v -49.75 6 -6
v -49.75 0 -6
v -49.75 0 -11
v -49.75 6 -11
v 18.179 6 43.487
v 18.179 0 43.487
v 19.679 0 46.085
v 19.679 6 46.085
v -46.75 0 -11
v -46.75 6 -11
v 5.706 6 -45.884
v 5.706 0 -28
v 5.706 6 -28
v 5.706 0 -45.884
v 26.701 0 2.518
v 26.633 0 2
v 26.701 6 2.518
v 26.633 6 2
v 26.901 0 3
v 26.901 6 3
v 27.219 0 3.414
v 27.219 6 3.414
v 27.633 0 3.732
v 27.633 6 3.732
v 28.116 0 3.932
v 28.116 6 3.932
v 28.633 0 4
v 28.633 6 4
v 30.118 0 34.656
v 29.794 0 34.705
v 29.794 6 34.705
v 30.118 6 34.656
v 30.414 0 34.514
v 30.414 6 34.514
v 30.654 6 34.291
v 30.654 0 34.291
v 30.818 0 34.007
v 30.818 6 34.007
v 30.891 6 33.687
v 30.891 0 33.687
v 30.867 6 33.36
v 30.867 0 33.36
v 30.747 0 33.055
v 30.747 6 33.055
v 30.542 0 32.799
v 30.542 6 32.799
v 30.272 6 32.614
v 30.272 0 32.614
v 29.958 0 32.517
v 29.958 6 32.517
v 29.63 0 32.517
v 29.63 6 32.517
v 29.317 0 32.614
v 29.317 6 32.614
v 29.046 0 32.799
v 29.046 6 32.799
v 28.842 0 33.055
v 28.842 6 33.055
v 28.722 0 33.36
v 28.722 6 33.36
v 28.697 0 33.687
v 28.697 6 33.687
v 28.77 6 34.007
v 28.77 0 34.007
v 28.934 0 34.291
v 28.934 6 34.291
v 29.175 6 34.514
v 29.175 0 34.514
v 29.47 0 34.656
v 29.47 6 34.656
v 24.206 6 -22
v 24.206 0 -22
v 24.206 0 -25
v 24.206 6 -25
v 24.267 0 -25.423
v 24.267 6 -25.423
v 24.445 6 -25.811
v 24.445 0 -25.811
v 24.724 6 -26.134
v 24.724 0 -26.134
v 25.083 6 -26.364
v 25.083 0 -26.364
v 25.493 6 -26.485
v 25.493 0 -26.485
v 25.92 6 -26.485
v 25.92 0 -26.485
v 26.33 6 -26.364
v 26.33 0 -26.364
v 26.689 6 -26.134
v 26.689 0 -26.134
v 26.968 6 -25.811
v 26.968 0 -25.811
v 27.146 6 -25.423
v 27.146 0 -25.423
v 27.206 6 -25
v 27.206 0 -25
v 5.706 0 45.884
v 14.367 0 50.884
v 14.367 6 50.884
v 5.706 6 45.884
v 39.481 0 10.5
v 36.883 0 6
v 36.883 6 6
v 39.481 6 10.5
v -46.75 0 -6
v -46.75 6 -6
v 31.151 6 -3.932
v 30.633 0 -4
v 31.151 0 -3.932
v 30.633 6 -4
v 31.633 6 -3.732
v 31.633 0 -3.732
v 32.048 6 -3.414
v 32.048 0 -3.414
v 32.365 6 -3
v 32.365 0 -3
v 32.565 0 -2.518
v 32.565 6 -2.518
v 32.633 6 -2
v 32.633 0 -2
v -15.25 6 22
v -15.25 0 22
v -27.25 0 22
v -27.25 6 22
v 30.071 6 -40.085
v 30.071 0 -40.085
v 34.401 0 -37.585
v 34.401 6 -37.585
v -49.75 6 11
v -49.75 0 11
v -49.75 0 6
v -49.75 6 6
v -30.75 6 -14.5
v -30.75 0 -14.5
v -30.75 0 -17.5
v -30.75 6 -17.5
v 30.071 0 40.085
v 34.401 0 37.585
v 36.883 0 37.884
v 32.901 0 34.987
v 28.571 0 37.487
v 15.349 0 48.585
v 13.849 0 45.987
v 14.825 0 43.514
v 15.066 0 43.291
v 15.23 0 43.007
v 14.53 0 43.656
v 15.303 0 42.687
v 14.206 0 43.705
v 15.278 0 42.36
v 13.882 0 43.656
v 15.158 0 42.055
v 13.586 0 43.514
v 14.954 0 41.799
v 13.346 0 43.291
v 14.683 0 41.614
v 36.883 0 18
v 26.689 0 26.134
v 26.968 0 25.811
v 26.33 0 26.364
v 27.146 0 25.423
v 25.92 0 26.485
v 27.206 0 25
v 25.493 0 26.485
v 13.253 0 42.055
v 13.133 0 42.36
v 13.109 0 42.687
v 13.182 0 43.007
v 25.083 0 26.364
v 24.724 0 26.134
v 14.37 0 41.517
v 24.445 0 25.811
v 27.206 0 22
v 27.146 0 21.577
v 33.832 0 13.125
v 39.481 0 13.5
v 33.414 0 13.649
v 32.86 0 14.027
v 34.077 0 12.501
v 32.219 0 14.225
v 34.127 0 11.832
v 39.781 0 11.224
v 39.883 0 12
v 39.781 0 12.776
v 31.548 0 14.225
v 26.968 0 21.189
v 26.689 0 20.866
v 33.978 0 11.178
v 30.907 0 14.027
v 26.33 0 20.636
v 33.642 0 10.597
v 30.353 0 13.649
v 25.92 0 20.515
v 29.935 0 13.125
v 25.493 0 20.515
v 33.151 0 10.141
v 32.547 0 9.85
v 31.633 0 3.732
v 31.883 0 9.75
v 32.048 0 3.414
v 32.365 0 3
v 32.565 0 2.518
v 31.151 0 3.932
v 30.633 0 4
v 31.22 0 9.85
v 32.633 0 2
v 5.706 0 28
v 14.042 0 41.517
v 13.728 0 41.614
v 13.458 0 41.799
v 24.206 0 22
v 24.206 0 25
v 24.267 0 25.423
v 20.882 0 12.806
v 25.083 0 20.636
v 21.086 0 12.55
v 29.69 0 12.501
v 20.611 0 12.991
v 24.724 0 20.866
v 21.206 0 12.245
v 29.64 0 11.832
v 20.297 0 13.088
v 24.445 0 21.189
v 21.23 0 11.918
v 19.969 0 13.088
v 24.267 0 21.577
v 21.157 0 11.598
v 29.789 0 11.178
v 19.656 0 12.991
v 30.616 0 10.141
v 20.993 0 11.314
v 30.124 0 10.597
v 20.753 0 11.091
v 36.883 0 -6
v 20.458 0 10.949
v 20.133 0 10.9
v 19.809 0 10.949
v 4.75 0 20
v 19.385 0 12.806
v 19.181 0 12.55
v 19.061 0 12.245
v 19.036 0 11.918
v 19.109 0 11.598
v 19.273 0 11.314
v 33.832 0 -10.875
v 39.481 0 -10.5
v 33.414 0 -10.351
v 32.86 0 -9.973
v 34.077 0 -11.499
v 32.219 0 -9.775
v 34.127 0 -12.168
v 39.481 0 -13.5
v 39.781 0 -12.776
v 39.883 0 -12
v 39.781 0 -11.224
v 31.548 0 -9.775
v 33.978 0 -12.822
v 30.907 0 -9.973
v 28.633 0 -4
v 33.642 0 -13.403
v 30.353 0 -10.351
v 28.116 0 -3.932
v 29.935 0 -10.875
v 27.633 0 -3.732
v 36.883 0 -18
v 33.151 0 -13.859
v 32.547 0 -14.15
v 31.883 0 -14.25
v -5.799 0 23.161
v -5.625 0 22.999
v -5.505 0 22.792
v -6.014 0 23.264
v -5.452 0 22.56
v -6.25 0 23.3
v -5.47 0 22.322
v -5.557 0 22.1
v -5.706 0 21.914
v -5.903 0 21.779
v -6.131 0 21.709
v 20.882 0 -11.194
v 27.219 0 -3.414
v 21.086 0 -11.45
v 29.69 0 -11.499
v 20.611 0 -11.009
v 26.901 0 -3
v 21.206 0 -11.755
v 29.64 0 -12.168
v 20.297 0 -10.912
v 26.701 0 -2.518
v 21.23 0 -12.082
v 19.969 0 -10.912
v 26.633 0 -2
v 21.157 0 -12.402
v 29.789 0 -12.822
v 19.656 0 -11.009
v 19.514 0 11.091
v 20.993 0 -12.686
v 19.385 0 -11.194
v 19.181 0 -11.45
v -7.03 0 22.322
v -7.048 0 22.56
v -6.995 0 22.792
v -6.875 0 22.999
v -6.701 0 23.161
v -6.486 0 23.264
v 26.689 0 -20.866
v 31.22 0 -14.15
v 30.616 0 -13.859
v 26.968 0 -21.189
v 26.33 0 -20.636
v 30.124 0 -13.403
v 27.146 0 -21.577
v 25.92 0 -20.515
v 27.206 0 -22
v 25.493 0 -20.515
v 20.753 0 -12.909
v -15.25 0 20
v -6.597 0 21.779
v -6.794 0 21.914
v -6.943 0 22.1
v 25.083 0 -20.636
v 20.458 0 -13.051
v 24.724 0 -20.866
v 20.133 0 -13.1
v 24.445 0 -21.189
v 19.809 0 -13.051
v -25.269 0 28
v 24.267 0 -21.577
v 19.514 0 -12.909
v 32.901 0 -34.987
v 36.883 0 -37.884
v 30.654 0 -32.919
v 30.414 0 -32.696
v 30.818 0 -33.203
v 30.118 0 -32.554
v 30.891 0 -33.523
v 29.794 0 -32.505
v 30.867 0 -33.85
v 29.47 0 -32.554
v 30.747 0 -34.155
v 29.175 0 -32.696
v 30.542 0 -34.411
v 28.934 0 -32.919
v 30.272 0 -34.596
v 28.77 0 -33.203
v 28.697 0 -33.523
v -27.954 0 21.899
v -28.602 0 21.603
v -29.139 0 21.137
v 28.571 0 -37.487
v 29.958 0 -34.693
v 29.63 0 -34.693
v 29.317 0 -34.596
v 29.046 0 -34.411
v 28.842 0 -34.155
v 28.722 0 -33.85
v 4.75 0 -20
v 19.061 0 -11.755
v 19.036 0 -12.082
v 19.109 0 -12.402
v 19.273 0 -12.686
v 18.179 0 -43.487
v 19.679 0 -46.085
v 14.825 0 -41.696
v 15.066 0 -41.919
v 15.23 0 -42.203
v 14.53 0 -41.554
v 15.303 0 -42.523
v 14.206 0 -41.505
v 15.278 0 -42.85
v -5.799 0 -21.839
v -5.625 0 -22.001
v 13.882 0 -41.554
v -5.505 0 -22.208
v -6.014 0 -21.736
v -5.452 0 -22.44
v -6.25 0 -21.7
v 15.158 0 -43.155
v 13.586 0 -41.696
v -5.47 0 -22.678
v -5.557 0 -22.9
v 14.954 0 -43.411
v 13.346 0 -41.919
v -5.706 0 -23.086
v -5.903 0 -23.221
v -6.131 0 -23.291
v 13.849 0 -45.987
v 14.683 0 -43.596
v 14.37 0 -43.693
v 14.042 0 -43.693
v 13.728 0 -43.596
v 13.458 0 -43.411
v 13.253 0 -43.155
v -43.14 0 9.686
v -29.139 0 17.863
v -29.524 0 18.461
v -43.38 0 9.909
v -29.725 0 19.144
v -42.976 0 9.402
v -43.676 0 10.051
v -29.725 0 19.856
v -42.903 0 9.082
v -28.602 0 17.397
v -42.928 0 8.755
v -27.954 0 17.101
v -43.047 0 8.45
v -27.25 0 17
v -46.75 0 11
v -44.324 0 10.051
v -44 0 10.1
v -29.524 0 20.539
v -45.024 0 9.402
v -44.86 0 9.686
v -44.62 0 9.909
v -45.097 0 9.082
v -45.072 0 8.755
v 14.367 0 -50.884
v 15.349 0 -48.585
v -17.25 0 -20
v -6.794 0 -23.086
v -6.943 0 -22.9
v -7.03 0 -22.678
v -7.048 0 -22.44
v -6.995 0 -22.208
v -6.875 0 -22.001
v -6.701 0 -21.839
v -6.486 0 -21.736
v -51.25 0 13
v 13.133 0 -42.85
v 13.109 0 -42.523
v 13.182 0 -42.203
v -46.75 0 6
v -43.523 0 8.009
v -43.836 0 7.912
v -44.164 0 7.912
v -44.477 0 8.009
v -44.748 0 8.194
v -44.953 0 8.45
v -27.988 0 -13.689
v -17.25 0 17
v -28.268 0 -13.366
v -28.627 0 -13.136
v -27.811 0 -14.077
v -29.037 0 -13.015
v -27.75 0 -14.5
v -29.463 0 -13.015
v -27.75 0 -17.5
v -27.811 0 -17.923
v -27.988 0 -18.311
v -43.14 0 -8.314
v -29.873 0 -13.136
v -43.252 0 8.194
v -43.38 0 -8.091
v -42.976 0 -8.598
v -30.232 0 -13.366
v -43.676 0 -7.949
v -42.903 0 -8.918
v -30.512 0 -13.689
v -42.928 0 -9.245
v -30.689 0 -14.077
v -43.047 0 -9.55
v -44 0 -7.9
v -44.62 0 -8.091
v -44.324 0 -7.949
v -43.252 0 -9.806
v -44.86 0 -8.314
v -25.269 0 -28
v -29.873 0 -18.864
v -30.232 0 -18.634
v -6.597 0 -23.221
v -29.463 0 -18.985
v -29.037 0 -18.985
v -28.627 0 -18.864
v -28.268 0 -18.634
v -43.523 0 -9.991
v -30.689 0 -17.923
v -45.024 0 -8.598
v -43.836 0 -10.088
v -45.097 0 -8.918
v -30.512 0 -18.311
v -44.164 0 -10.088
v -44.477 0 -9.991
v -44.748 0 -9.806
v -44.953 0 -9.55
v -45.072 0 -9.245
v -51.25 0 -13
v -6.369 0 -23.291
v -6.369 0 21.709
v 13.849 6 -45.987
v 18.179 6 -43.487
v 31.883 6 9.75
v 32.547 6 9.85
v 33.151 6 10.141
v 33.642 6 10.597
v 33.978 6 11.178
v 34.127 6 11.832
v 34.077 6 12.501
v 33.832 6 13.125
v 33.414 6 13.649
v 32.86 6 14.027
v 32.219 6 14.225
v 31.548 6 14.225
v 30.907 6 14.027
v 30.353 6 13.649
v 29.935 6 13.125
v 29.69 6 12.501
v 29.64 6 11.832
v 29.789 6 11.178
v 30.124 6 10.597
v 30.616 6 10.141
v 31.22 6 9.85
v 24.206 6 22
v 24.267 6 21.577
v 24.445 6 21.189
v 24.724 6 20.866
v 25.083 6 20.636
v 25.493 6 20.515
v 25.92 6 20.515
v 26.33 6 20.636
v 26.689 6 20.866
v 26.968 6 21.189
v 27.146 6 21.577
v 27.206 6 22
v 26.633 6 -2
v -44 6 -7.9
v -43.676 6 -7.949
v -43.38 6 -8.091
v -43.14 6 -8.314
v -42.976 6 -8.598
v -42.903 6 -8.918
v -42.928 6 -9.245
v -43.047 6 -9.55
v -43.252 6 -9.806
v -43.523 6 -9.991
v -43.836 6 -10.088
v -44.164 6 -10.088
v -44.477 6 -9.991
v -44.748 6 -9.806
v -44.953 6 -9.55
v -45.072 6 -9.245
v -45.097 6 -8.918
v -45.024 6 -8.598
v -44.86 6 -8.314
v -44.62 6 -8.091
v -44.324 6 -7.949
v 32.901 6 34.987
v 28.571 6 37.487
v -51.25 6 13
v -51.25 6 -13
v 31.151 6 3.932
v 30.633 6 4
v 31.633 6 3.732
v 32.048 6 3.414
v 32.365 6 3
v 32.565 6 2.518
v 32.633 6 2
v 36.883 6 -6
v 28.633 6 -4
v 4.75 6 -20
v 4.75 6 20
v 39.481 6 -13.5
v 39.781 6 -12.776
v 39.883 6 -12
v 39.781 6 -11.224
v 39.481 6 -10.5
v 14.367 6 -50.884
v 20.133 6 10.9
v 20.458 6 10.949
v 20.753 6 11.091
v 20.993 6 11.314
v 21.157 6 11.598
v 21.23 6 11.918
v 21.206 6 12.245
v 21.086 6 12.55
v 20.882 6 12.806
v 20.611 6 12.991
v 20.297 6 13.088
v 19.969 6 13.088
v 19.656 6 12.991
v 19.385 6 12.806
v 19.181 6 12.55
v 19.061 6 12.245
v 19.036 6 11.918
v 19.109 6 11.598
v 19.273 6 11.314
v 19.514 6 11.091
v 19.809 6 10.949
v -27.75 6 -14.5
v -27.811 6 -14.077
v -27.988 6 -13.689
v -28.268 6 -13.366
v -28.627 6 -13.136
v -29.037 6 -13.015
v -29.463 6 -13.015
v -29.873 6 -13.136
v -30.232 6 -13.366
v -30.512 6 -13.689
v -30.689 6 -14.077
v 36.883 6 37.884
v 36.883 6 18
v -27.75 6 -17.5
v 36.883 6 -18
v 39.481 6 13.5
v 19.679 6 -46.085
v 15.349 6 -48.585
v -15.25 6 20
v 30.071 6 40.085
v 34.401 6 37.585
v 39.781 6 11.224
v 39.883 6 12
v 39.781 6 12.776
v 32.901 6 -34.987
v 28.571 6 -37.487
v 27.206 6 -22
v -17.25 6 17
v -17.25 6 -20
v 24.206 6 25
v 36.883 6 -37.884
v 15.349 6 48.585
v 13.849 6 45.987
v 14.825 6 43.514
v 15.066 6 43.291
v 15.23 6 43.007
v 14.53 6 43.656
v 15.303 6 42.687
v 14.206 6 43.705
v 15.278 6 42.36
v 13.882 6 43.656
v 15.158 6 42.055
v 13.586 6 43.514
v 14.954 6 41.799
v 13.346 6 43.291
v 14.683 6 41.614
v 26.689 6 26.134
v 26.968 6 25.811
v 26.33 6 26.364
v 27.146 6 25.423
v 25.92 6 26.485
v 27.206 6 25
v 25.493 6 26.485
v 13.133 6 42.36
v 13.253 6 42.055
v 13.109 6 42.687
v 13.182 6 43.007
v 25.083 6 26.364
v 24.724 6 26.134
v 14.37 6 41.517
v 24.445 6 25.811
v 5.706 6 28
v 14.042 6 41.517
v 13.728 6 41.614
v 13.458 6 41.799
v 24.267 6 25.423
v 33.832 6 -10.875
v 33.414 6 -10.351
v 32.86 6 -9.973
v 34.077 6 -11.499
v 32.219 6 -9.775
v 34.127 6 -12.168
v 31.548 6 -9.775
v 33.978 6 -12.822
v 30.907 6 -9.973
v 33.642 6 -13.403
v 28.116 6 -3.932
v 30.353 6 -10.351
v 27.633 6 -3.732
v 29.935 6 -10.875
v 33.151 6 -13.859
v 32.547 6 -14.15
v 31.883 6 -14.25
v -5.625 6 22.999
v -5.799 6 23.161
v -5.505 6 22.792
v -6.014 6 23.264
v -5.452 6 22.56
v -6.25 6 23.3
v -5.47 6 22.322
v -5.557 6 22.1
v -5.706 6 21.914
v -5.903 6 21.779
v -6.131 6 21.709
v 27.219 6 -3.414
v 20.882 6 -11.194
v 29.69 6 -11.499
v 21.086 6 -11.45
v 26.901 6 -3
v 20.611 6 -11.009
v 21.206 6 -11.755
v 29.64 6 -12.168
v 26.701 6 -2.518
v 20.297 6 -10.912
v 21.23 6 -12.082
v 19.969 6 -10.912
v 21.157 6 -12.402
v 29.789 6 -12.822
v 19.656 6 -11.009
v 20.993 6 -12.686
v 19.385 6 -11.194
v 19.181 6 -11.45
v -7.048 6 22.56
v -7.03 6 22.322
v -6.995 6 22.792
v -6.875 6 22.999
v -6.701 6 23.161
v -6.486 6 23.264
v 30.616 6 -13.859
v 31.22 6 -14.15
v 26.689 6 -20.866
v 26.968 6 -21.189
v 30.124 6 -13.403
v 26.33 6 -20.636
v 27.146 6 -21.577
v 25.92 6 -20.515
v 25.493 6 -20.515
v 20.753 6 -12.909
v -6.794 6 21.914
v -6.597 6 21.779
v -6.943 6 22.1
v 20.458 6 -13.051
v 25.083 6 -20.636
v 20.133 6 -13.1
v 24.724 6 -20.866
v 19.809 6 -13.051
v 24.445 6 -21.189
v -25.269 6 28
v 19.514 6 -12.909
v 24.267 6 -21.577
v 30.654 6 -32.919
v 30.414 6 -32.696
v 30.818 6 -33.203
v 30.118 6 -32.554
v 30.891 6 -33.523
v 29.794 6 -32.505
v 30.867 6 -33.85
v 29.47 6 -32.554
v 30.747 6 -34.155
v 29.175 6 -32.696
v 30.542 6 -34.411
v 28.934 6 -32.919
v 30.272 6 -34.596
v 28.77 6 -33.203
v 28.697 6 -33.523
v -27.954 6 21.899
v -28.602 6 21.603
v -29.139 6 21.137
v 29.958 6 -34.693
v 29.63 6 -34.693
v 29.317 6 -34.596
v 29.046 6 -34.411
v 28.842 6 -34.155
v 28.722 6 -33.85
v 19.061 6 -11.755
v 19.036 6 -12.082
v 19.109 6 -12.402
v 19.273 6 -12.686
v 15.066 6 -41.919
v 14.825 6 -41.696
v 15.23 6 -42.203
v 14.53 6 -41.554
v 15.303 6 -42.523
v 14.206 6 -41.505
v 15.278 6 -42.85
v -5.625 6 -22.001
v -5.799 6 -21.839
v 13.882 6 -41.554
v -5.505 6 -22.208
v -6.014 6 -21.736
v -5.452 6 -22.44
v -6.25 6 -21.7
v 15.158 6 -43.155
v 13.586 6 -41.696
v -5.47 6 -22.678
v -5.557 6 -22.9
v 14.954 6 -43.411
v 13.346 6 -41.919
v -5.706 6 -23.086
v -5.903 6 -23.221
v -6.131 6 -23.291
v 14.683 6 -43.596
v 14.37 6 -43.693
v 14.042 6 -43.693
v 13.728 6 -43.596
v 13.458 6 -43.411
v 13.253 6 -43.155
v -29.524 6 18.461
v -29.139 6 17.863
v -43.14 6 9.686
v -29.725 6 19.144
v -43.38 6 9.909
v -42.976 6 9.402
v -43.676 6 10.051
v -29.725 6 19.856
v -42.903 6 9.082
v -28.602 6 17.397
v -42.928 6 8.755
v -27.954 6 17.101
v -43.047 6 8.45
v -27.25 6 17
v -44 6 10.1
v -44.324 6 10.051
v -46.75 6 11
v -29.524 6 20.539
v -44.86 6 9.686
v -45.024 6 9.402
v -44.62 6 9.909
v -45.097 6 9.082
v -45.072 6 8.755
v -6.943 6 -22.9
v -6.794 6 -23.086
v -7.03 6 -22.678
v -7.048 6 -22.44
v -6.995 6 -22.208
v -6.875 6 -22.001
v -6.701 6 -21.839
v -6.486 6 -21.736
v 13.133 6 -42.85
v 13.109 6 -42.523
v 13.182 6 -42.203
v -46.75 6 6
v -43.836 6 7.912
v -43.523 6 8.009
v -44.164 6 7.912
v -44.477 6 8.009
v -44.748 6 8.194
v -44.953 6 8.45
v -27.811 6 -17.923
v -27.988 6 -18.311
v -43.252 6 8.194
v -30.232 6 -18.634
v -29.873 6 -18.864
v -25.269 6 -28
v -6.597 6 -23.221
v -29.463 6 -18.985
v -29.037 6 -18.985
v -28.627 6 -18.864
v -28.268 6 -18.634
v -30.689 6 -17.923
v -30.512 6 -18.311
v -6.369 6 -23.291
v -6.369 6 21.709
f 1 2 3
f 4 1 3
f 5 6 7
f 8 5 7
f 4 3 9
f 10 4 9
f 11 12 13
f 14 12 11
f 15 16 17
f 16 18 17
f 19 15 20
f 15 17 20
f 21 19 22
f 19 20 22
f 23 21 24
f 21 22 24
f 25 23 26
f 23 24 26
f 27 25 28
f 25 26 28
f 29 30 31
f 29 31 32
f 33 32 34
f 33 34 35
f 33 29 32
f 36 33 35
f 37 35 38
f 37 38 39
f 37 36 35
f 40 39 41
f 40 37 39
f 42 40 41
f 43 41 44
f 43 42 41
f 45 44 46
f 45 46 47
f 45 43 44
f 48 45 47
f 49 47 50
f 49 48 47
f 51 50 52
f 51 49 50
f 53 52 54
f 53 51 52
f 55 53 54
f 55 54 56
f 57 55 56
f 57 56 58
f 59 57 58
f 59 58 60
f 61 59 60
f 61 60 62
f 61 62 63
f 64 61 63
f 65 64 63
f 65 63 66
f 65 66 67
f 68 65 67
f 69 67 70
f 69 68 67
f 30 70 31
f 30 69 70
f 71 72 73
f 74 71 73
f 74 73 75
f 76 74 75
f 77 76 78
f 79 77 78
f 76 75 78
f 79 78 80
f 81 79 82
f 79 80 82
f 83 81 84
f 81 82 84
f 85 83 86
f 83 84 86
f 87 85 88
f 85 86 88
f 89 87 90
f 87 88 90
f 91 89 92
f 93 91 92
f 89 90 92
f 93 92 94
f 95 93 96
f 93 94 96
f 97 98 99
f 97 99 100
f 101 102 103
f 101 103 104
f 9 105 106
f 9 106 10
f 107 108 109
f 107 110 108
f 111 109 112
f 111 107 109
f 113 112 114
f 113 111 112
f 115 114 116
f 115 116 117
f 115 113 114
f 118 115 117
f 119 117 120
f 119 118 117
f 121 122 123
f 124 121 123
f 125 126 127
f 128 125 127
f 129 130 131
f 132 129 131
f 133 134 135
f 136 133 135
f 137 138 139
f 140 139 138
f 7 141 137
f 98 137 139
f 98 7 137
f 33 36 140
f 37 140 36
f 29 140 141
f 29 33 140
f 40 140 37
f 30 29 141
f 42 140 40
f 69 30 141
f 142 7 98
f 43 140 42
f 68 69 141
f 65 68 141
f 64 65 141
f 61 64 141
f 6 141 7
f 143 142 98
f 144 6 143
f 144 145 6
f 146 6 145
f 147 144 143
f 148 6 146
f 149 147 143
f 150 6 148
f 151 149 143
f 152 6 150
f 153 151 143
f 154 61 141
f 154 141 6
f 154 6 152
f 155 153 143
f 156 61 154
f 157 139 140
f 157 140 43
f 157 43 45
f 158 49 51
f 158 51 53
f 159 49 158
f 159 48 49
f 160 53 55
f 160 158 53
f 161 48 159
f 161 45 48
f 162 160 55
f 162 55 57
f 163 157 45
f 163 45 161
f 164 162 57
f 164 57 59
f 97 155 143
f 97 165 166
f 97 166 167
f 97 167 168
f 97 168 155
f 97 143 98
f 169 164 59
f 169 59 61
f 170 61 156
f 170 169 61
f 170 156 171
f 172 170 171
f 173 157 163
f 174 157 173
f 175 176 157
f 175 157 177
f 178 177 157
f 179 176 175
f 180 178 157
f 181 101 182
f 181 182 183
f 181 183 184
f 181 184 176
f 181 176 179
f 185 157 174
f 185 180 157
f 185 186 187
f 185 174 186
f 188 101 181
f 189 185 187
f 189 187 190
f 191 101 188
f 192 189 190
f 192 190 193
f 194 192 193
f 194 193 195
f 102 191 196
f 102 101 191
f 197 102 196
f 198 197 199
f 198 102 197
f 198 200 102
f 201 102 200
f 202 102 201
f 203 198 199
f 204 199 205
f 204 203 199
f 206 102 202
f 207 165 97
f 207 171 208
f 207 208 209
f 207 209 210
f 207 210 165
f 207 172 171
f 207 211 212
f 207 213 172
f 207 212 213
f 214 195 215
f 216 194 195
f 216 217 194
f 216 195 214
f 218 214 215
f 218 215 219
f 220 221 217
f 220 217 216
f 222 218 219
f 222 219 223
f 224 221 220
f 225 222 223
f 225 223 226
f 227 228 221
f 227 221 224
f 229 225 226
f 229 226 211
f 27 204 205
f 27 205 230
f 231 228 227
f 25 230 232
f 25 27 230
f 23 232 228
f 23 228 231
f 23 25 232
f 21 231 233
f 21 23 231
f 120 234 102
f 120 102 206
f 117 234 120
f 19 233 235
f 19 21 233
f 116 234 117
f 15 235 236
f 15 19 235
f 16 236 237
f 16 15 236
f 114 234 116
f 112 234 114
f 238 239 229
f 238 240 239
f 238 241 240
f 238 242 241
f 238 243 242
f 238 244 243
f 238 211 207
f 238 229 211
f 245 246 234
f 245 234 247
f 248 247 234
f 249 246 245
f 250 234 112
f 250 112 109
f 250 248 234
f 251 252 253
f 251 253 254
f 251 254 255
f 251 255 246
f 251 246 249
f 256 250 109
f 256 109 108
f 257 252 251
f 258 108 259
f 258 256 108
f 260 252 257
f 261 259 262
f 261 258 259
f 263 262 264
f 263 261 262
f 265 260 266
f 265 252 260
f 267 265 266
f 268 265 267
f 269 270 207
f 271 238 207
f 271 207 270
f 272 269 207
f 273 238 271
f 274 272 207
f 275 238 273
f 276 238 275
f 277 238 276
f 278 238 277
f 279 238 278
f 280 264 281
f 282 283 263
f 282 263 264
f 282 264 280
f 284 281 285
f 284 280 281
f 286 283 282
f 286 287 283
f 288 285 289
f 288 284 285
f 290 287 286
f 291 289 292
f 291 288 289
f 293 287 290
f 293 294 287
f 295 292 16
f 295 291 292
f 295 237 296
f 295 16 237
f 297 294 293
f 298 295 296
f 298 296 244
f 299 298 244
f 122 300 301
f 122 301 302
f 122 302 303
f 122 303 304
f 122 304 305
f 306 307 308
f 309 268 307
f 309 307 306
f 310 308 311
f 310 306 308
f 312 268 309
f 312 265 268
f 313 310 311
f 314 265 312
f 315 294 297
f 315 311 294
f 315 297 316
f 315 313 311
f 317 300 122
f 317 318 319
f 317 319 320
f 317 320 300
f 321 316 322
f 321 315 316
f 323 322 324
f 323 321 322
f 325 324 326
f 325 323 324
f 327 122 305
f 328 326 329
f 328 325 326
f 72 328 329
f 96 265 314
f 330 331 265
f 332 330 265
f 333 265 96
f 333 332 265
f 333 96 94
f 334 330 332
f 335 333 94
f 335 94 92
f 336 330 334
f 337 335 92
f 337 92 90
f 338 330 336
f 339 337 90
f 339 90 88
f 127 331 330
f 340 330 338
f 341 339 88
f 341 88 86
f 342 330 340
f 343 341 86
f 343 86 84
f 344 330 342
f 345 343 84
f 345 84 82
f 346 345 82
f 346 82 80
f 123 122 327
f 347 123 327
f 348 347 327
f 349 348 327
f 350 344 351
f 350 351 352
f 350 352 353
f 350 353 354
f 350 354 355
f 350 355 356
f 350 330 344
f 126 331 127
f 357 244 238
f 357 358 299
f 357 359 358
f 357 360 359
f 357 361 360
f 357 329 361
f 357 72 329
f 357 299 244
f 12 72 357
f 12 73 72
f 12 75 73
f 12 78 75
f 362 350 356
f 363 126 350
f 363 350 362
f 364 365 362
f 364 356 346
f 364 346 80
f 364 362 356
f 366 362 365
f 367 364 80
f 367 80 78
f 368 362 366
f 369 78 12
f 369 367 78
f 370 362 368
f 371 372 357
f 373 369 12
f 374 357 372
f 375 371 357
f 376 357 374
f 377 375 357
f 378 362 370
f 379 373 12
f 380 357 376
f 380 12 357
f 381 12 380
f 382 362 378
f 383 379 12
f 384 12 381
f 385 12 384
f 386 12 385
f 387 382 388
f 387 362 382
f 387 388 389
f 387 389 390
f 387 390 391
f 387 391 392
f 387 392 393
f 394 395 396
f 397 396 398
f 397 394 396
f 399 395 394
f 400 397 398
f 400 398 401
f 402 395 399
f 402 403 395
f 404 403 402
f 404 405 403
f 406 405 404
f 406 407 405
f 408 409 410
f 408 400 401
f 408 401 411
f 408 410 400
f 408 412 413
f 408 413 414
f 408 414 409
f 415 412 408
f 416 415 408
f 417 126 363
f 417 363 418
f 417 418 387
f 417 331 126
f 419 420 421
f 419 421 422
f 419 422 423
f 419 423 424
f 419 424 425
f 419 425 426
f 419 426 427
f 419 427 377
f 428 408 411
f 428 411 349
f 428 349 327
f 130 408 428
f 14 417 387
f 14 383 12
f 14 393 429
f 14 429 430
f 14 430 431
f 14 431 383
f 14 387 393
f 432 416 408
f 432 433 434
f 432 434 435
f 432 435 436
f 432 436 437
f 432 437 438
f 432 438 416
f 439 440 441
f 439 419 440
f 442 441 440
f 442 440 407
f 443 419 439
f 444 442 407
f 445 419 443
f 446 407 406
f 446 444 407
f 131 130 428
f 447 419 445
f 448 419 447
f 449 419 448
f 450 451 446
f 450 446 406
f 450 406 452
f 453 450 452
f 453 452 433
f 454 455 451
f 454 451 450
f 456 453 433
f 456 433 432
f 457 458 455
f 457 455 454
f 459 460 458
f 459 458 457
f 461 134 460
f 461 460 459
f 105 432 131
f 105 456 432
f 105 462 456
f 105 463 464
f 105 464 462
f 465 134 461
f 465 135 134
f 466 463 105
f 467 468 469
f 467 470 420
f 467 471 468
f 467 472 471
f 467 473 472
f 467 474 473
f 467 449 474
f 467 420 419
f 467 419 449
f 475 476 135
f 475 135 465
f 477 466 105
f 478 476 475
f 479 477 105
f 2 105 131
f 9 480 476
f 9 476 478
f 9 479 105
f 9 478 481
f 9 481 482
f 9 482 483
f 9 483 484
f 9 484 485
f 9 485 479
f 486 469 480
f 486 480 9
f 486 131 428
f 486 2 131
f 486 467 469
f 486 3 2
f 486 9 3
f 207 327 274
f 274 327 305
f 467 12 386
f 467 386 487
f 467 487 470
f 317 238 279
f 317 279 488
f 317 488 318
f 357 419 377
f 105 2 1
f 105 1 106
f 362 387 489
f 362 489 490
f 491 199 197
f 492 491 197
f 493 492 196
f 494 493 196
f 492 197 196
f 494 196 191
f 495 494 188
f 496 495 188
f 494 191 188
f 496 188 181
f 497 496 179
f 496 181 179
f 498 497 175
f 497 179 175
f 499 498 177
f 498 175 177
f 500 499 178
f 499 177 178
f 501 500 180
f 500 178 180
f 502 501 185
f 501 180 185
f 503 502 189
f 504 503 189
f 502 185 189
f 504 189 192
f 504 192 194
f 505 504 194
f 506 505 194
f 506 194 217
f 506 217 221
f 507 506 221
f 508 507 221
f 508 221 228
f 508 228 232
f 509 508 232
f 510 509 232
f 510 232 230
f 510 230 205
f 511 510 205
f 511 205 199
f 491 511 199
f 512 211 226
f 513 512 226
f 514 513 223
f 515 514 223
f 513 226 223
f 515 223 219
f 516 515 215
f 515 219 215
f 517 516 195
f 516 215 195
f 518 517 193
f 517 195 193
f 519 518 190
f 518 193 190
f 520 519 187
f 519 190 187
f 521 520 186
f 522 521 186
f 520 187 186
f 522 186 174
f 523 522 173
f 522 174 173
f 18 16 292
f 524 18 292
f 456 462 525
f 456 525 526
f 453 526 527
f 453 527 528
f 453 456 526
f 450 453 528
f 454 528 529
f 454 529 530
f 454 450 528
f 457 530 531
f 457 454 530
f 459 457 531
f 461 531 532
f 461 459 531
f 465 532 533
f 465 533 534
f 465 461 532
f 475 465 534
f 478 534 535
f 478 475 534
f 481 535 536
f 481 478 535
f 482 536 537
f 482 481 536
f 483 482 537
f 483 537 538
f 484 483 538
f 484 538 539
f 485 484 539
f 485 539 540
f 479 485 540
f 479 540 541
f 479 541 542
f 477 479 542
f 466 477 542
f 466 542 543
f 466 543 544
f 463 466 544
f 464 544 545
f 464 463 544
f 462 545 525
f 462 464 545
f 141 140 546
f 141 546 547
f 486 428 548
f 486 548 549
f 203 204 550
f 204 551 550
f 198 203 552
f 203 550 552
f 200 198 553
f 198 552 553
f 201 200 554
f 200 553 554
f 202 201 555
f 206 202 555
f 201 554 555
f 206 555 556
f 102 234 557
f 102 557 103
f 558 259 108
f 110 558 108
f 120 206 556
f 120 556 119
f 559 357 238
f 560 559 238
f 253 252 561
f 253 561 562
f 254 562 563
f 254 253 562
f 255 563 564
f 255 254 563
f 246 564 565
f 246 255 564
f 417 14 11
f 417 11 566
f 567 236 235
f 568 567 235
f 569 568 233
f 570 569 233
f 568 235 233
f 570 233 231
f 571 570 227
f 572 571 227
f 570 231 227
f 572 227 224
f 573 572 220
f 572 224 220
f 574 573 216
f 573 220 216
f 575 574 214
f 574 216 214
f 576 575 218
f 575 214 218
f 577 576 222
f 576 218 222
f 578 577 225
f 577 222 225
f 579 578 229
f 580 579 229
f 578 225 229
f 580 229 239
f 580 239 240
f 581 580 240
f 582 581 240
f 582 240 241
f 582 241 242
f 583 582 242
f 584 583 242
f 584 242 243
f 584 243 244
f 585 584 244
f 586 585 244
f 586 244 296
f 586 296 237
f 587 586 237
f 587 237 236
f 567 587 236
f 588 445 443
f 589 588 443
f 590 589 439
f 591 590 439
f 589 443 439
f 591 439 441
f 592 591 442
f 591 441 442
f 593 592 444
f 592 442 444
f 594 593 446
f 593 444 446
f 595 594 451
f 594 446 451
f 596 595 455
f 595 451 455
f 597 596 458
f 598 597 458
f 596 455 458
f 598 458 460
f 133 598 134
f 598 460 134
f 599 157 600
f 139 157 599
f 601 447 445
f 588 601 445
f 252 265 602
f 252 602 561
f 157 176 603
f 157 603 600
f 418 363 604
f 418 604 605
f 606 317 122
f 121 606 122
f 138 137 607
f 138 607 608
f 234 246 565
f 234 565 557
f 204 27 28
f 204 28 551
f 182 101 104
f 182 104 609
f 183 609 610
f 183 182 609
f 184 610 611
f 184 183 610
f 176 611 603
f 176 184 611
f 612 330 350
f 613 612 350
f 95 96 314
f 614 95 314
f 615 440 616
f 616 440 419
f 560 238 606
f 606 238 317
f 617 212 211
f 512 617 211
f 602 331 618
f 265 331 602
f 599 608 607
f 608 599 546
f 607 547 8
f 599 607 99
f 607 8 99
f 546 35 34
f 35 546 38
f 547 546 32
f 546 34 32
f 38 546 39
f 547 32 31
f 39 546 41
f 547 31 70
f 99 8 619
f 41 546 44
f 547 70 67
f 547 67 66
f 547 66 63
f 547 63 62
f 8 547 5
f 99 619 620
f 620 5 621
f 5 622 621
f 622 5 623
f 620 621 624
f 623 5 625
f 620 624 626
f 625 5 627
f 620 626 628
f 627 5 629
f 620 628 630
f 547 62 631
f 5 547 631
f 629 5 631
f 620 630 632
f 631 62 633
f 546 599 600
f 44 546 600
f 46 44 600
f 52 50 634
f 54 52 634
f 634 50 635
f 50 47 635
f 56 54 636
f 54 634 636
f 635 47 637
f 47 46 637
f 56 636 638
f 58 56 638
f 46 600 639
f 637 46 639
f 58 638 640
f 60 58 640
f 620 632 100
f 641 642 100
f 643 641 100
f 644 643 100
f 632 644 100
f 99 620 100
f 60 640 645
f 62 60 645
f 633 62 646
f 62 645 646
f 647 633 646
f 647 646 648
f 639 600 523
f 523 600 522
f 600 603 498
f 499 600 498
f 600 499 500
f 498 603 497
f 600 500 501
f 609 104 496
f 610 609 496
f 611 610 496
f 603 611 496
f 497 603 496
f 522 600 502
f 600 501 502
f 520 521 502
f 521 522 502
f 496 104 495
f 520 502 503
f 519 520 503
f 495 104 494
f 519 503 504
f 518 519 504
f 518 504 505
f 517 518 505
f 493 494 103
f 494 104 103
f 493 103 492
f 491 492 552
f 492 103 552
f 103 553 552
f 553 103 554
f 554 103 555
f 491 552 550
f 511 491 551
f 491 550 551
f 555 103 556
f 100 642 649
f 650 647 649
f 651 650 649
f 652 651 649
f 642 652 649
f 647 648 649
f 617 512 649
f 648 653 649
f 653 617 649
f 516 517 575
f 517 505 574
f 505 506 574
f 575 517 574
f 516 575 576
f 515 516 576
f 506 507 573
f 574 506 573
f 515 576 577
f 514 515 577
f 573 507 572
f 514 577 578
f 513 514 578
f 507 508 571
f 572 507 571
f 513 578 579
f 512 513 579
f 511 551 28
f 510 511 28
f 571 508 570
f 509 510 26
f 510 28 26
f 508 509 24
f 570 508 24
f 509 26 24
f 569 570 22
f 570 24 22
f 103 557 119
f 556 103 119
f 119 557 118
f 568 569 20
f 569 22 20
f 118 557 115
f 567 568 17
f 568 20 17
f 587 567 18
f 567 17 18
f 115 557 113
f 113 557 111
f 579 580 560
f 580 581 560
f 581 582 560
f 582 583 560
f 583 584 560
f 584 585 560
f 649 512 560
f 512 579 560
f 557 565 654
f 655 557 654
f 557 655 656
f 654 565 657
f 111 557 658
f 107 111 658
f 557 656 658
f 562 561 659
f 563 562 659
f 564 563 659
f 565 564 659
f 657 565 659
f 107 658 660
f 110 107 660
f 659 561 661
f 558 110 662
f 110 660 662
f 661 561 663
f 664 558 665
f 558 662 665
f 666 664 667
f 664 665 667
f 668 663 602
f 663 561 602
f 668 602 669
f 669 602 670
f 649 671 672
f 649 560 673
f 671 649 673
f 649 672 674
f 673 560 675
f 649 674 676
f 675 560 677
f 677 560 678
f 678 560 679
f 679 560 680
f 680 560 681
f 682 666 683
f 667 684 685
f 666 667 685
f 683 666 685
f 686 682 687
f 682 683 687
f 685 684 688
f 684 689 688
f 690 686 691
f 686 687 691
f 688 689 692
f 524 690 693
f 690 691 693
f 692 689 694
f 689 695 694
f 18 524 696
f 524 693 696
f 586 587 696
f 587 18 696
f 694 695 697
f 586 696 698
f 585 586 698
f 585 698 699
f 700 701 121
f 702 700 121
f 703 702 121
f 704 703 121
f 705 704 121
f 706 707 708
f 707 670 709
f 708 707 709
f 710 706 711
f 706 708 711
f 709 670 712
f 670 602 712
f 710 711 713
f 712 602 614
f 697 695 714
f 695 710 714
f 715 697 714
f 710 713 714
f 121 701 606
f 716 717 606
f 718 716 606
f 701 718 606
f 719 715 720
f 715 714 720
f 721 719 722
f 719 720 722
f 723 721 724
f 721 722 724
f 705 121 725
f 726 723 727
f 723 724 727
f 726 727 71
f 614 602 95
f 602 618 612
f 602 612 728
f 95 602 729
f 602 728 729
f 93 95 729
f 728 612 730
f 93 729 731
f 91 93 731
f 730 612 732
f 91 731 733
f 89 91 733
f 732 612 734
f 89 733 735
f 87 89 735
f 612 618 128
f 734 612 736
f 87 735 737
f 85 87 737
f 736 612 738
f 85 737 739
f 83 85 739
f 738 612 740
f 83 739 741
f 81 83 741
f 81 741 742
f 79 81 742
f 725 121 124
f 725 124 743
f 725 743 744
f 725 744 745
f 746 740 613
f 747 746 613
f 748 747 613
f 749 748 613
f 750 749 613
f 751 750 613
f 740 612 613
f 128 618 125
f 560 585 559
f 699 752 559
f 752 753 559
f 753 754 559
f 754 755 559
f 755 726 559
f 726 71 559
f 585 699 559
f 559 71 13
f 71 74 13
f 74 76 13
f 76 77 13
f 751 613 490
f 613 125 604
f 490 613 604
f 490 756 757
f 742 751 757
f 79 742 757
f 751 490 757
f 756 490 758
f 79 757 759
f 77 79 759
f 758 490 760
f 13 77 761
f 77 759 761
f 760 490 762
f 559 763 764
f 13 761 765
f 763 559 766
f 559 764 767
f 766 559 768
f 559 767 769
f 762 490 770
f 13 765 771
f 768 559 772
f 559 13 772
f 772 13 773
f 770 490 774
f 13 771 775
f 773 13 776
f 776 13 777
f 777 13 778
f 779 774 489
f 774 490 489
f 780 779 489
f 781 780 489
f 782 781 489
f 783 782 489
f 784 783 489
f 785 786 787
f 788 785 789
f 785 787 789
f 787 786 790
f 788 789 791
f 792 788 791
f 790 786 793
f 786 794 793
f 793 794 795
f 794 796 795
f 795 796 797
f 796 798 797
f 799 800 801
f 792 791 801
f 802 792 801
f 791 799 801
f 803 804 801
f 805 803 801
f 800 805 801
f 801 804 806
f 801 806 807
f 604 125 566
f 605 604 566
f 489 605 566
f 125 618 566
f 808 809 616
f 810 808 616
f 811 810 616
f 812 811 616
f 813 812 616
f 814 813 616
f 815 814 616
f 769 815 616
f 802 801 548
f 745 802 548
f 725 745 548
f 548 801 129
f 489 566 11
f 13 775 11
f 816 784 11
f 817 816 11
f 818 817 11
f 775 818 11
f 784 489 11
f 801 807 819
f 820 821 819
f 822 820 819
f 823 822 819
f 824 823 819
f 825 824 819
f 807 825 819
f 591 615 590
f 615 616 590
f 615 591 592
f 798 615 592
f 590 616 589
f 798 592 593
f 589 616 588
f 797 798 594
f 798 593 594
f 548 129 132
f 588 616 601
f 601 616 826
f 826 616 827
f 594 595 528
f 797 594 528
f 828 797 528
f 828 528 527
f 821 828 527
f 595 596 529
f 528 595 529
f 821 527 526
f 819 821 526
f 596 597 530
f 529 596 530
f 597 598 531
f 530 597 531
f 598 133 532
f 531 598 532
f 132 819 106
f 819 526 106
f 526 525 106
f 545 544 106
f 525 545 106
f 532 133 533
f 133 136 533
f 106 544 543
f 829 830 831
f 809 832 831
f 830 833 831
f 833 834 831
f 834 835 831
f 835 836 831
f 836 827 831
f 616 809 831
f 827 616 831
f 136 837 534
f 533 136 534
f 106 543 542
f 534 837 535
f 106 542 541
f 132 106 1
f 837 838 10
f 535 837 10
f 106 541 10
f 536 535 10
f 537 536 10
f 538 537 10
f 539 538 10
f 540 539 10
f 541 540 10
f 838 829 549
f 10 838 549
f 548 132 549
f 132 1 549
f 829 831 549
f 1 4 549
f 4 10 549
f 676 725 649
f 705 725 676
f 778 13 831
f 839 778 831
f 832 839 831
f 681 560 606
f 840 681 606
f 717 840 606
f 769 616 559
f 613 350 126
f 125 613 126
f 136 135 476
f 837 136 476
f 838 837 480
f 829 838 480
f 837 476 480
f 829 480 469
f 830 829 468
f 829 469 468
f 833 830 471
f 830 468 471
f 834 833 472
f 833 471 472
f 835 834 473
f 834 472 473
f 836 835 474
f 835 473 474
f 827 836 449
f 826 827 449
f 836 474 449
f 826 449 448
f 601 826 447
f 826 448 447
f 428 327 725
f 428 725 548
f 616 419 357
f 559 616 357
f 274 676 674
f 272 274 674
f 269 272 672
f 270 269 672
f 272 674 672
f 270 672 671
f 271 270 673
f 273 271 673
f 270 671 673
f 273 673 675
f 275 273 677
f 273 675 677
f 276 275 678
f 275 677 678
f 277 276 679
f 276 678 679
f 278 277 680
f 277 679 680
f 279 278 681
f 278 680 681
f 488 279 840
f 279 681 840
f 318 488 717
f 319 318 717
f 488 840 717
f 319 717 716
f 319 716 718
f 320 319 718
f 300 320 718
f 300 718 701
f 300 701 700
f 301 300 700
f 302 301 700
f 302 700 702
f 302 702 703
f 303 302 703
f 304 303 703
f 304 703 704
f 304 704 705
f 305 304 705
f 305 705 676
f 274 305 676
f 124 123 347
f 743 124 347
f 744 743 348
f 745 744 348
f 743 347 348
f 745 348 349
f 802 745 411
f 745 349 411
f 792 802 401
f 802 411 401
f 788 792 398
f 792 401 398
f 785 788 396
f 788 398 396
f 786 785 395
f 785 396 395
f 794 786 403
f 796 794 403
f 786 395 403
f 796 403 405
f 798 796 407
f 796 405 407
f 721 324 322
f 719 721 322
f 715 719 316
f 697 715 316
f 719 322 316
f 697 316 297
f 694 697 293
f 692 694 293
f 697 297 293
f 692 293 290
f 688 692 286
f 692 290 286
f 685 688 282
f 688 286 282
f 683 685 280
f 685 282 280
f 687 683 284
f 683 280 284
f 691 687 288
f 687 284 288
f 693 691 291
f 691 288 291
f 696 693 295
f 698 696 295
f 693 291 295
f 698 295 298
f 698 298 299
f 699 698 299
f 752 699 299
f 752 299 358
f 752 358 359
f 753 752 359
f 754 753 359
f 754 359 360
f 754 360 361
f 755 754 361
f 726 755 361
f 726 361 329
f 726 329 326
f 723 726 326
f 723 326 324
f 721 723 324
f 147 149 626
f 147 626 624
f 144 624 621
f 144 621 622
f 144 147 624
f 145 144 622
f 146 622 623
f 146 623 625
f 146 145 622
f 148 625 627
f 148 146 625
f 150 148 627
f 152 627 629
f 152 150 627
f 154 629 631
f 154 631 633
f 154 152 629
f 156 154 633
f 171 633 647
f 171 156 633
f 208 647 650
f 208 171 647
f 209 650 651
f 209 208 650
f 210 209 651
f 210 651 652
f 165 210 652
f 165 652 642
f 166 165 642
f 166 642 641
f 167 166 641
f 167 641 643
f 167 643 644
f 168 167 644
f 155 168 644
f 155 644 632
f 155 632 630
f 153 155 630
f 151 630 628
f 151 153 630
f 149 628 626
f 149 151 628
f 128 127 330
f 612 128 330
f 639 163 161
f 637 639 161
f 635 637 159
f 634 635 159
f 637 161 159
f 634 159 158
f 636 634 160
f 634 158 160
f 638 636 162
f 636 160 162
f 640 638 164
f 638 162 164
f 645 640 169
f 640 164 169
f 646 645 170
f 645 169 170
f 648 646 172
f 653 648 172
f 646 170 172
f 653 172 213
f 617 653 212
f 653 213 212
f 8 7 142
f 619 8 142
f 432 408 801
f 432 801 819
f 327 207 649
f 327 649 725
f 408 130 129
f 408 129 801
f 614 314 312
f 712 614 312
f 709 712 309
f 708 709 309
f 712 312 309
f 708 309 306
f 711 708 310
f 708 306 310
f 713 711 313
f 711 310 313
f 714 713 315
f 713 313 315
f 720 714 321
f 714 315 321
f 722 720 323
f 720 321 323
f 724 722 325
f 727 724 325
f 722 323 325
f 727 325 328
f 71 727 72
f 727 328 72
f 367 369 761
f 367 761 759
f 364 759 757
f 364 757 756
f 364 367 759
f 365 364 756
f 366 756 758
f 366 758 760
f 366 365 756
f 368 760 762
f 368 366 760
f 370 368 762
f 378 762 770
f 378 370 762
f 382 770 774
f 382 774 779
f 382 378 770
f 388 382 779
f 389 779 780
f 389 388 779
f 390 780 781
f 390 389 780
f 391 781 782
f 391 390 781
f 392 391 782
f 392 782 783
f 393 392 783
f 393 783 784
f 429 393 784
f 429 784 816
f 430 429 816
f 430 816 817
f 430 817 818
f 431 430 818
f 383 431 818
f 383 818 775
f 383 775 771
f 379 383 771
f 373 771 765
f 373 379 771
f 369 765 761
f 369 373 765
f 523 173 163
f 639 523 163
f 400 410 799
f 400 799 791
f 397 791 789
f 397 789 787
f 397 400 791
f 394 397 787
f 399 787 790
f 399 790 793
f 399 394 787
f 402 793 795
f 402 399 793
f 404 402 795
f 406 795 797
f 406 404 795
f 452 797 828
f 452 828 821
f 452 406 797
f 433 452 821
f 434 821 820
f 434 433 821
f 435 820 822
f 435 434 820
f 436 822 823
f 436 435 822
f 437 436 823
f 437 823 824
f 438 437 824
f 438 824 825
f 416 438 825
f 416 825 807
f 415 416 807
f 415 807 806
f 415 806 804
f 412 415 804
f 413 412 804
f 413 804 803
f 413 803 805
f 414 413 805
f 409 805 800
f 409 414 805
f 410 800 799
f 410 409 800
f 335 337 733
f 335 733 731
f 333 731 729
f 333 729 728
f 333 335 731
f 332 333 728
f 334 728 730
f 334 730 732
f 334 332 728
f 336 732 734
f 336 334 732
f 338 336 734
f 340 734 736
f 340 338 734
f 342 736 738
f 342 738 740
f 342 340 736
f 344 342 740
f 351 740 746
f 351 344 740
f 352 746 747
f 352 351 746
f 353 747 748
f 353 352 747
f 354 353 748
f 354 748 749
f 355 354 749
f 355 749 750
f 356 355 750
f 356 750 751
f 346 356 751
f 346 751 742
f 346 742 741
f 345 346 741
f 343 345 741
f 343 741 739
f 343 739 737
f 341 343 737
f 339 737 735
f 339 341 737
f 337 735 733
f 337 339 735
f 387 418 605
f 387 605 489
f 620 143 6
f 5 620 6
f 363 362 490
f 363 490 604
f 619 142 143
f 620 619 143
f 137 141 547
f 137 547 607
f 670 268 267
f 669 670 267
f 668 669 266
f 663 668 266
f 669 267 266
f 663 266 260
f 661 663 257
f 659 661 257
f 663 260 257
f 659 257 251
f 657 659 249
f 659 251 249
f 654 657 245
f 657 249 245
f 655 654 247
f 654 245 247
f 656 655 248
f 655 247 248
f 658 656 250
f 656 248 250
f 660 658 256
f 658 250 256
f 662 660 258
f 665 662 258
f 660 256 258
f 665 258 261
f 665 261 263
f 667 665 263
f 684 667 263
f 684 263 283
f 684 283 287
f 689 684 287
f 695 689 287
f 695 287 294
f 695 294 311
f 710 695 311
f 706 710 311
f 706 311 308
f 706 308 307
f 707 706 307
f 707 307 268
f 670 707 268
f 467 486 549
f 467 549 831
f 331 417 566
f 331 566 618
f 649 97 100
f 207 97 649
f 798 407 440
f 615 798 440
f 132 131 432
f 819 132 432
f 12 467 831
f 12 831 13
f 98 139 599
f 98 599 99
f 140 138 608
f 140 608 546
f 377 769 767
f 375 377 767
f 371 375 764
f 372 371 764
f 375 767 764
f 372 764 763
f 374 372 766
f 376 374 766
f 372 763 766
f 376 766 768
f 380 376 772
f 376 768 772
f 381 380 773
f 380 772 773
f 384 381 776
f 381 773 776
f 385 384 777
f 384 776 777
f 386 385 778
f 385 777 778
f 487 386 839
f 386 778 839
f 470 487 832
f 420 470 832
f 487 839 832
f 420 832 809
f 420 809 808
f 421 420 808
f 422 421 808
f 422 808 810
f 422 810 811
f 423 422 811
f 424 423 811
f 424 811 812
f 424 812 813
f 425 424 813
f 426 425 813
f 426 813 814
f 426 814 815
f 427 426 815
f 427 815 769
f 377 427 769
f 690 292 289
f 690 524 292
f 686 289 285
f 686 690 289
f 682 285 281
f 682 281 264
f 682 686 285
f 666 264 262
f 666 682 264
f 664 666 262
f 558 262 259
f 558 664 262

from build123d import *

# Parameters (mm, degrees)
SKETCH1_R                  = 1.1
SKETCH1_W                  = 3
SKETCH1_H                  = 5
SKETCH1_W_2                = 6
SKETCH1_H_2                = 8
BOSS_EXTRUDE1_DEPTH        = 6
F_1_6_1_6_DIAMETER_HOLE3_D = 1.6
BOSS_EXTRUDE2_DEPTH        = 6
FILLET1_R                  = 2
F_2_2_2_2_DIAMETER_HOLE1_D = 2.2
F_4_0MM_DOWEL_HOLE1_D      = 4.5


with BuildPart() as part:
    # Sketch1 → Boss-Extrude1 (new body)
    with BuildSketch(Plane(origin=(0, 0, 0), x_dir=(1, 0, 0), z_dir=(0, 1, 0))):
        Polygon((14.366669751, 50.883801944), (36.883330249, 37.883801944), (36.883330249, -37.883801944), (14.366669751, -50.883801944), (5.706415713, -45.883801944), (5.706415713, -28), (-25.269237886, -28), (-51.25, -13), (-51.25, 13), (-25.269237886, 28), (5.706415713, 28), (5.706415713, 45.883801944), align=None)
        with Locations(Location((14.205771366, 42.605117767, 0), (0, 0, 270))):
            Circle(SKETCH1_R, mode=Mode.SUBTRACT)
        with Locations(Location((29.794228634, 33.605117767, 0), (0, 0, 270))):
            Circle(SKETCH1_R, mode=Mode.SUBTRACT)
        with Locations(Location((29.794228634, -33.605117767, 0), (0, 0, 270))):
            Circle(SKETCH1_R, mode=Mode.SUBTRACT)
        with Locations(Location((14.205771366, -42.605117767, 0), (0, 0, 270))):
            Circle(SKETCH1_R, mode=Mode.SUBTRACT)
        with Locations(Location((-44, 9, 0), (0, 0, 270))):
            Circle(SKETCH1_R, mode=Mode.SUBTRACT)
        with Locations(Location((-44, -9, 0), (0, 0, 270))):
            Circle(SKETCH1_R, mode=Mode.SUBTRACT)
        with BuildLine():
            Line((4.75, -20), (-15.25, -20))
            Line((-15.25, -20), (-15.25, -22))
            Line((-15.25, -22), (-27.25, -22))
            ThreePointArc((-27.25, -22), (-29.75, -19.5), (-27.25, -17))
            Line((-27.25, -17), (-17.25, -17))
            Line((-17.25, -17), (-17.25, 20))
            Line((-17.25, 20), (4.75, 20))
            Line((4.75, 20), (4.75, -20))
        make_face(mode=Mode.SUBTRACT)
        Polygon((30.071152423, 40.084763838), (34.401279442, 37.584763838), (32.901279442, 34.986687627), (28.571152423, 37.486687627), align=None, mode=Mode.SUBTRACT)
        Polygon((15.348720558, 48.584763838), (13.848720558, 45.986687627), (18.178847577, 43.486687627), (19.678847577, 46.084763838), align=None, mode=Mode.SUBTRACT)
        Polygon((34.401279442, -37.584763838), (32.901279442, -34.986687627), (28.571152423, -37.486687627), (30.071152423, -40.084763838), align=None, mode=Mode.SUBTRACT)
        Polygon((18.178847577, -43.486687627), (19.678847577, -46.084763838), (15.348720558, -48.584763838), (13.848720558, -45.986687627), align=None, mode=Mode.SUBTRACT)
        with Locations((-48.25, -8.5)):
            Rectangle(SKETCH1_W, SKETCH1_H, mode=Mode.SUBTRACT)
        with Locations((-48.25, 8.5)):
            Rectangle(SKETCH1_W, SKETCH1_H, mode=Mode.SUBTRACT)
        with BuildLine():
            Line((-30.75, 14.5), (-30.75, 17.5))
            ThreePointArc((-30.75, 17.5), (-29.25, 19), (-27.75, 17.5))
            Line((-27.75, 17.5), (-27.75, 14.5))
            ThreePointArc((-27.75, 14.5), (-29.25, 13), (-30.75, 14.5))
        make_face(mode=Mode.SUBTRACT)
        with BuildLine():
            Line((24.206415713, -25), (24.206415713, -22))
            ThreePointArc((24.206415713, -22), (25.706415713, -20.5), (27.206415713, -22))
            Line((27.206415713, -22), (27.206415713, -25))
            ThreePointArc((27.206415713, -25), (25.706415713, -26.5), (24.206415713, -25))
        make_face(mode=Mode.SUBTRACT)
        with BuildLine():
            Line((24.206415713, 22), (24.206415713, 25))
            ThreePointArc((24.206415713, 25), (25.706415713, 26.5), (27.206415713, 25))
            Line((27.206415713, 25), (27.206415713, 22))
            ThreePointArc((27.206415713, 22), (25.706415713, 20.5), (24.206415713, 22))
        make_face(mode=Mode.SUBTRACT)
        with Locations((29.633330249, 0)):
            Rectangle(SKETCH1_W_2, SKETCH1_H_2, mode=Mode.SUBTRACT)
    extrude(amount=BOSS_EXTRUDE1_DEPTH)

    # Ø1.6 (1.6) Diameter Hole3 (through all)
    with Locations(Plane(origin=(-6.25, 0, 22.5), x_dir=(0, 0, -1), z_dir=(0, -1, 0))):
        with Locations((0, 0), (45, 0)):
            Hole(F_1_6_1_6_DIAMETER_HOLE3_D / 2)

    # Sketch9 → Boss-Extrude2 (add)
    with BuildSketch(Plane.XZ):
        with BuildLine():
            Line((36.883330249, -9), (36.883330249, -15))
            ThreePointArc((36.883330249, -15), (38.383330249, -14.598076211), (39.481406461, -13.5))
            ThreePointArc((39.481406461, -13.5), (39.883330249, -12), (39.481406461, -10.5))
            ThreePointArc((39.481406461, -10.5), (38.383330249, -9.401923789), (36.883330249, -9))
        make_face()
        with BuildLine():
            Line((36.883330249, -6), (36.883330249, -9))
            ThreePointArc((36.883330249, -9), (38.383330249, -9.401923789), (39.481406461, -10.5))
            Line((39.481406461, -10.5), (36.883330249, -6))
        make_face()
        with BuildLine():
            Line((36.883330249, -15), (36.883330249, -18))
            Line((36.883330249, -18), (39.481406461, -13.5))
            ThreePointArc((39.481406461, -13.5), (38.383330249, -14.598076211), (36.883330249, -15))
        make_face()
        with BuildLine():
            ThreePointArc((39.481406461, 10.5), (39.883330249, 12), (39.481406461, 13.5))
            ThreePointArc((39.481406461, 13.5), (38.383330249, 14.598076211), (36.883330249, 15))
            Line((36.883330249, 15), (36.883330249, 9))
            ThreePointArc((36.883330249, 9), (38.383330249, 9.401923789), (39.481406461, 10.5))
        make_face()
        with BuildLine():
            Line((36.883330249, 6), (39.481406461, 10.5))
            ThreePointArc((39.481406461, 10.5), (38.383330249, 9.401923789), (36.883330249, 9))
            Line((36.883330249, 9), (36.883330249, 6))
        make_face()
        with BuildLine():
            ThreePointArc((36.883330249, 15), (38.383330249, 14.598076211), (39.481406461, 13.5))
            Line((39.481406461, 13.5), (36.883330249, 18))
            Line((36.883330249, 18), (36.883330249, 15))
        make_face()
    extrude(amount=-BOSS_EXTRUDE2_DEPTH)

    # Fillet1
    fillet1_edges = [part.edges().sort_by_distance(p)[0] for p in [
        (32.633330249, 3, 4),
        (32.633330249, 3, -4),
        (26.633330249, 3, -4),
        (26.633330249, 3, 4),
    ]]
    fillet(fillet1_edges, radius=FILLET1_R)

    # Ø2.2 (2.2) Diameter Hole1 (through all)
    with Locations(Plane(origin=(20.133330249, 6, -12), x_dir=(0, 0, 1), z_dir=(0, 1, 0))):
        with Locations((0, 0), (24, 0)):
            Hole(F_2_2_2_2_DIAMETER_HOLE1_D / 2)

    # Ø4.0mm Dowel Hole1 (through all)
    with Locations(Plane(origin=(31.883330249, 6, -12), x_dir=(0, 0, 1), z_dir=(0, 1, 0))):
        with Locations((0, 0), (24, 0)):
            Hole(F_4_0MM_DOWEL_HOLE1_D / 2)


solid = part.part
